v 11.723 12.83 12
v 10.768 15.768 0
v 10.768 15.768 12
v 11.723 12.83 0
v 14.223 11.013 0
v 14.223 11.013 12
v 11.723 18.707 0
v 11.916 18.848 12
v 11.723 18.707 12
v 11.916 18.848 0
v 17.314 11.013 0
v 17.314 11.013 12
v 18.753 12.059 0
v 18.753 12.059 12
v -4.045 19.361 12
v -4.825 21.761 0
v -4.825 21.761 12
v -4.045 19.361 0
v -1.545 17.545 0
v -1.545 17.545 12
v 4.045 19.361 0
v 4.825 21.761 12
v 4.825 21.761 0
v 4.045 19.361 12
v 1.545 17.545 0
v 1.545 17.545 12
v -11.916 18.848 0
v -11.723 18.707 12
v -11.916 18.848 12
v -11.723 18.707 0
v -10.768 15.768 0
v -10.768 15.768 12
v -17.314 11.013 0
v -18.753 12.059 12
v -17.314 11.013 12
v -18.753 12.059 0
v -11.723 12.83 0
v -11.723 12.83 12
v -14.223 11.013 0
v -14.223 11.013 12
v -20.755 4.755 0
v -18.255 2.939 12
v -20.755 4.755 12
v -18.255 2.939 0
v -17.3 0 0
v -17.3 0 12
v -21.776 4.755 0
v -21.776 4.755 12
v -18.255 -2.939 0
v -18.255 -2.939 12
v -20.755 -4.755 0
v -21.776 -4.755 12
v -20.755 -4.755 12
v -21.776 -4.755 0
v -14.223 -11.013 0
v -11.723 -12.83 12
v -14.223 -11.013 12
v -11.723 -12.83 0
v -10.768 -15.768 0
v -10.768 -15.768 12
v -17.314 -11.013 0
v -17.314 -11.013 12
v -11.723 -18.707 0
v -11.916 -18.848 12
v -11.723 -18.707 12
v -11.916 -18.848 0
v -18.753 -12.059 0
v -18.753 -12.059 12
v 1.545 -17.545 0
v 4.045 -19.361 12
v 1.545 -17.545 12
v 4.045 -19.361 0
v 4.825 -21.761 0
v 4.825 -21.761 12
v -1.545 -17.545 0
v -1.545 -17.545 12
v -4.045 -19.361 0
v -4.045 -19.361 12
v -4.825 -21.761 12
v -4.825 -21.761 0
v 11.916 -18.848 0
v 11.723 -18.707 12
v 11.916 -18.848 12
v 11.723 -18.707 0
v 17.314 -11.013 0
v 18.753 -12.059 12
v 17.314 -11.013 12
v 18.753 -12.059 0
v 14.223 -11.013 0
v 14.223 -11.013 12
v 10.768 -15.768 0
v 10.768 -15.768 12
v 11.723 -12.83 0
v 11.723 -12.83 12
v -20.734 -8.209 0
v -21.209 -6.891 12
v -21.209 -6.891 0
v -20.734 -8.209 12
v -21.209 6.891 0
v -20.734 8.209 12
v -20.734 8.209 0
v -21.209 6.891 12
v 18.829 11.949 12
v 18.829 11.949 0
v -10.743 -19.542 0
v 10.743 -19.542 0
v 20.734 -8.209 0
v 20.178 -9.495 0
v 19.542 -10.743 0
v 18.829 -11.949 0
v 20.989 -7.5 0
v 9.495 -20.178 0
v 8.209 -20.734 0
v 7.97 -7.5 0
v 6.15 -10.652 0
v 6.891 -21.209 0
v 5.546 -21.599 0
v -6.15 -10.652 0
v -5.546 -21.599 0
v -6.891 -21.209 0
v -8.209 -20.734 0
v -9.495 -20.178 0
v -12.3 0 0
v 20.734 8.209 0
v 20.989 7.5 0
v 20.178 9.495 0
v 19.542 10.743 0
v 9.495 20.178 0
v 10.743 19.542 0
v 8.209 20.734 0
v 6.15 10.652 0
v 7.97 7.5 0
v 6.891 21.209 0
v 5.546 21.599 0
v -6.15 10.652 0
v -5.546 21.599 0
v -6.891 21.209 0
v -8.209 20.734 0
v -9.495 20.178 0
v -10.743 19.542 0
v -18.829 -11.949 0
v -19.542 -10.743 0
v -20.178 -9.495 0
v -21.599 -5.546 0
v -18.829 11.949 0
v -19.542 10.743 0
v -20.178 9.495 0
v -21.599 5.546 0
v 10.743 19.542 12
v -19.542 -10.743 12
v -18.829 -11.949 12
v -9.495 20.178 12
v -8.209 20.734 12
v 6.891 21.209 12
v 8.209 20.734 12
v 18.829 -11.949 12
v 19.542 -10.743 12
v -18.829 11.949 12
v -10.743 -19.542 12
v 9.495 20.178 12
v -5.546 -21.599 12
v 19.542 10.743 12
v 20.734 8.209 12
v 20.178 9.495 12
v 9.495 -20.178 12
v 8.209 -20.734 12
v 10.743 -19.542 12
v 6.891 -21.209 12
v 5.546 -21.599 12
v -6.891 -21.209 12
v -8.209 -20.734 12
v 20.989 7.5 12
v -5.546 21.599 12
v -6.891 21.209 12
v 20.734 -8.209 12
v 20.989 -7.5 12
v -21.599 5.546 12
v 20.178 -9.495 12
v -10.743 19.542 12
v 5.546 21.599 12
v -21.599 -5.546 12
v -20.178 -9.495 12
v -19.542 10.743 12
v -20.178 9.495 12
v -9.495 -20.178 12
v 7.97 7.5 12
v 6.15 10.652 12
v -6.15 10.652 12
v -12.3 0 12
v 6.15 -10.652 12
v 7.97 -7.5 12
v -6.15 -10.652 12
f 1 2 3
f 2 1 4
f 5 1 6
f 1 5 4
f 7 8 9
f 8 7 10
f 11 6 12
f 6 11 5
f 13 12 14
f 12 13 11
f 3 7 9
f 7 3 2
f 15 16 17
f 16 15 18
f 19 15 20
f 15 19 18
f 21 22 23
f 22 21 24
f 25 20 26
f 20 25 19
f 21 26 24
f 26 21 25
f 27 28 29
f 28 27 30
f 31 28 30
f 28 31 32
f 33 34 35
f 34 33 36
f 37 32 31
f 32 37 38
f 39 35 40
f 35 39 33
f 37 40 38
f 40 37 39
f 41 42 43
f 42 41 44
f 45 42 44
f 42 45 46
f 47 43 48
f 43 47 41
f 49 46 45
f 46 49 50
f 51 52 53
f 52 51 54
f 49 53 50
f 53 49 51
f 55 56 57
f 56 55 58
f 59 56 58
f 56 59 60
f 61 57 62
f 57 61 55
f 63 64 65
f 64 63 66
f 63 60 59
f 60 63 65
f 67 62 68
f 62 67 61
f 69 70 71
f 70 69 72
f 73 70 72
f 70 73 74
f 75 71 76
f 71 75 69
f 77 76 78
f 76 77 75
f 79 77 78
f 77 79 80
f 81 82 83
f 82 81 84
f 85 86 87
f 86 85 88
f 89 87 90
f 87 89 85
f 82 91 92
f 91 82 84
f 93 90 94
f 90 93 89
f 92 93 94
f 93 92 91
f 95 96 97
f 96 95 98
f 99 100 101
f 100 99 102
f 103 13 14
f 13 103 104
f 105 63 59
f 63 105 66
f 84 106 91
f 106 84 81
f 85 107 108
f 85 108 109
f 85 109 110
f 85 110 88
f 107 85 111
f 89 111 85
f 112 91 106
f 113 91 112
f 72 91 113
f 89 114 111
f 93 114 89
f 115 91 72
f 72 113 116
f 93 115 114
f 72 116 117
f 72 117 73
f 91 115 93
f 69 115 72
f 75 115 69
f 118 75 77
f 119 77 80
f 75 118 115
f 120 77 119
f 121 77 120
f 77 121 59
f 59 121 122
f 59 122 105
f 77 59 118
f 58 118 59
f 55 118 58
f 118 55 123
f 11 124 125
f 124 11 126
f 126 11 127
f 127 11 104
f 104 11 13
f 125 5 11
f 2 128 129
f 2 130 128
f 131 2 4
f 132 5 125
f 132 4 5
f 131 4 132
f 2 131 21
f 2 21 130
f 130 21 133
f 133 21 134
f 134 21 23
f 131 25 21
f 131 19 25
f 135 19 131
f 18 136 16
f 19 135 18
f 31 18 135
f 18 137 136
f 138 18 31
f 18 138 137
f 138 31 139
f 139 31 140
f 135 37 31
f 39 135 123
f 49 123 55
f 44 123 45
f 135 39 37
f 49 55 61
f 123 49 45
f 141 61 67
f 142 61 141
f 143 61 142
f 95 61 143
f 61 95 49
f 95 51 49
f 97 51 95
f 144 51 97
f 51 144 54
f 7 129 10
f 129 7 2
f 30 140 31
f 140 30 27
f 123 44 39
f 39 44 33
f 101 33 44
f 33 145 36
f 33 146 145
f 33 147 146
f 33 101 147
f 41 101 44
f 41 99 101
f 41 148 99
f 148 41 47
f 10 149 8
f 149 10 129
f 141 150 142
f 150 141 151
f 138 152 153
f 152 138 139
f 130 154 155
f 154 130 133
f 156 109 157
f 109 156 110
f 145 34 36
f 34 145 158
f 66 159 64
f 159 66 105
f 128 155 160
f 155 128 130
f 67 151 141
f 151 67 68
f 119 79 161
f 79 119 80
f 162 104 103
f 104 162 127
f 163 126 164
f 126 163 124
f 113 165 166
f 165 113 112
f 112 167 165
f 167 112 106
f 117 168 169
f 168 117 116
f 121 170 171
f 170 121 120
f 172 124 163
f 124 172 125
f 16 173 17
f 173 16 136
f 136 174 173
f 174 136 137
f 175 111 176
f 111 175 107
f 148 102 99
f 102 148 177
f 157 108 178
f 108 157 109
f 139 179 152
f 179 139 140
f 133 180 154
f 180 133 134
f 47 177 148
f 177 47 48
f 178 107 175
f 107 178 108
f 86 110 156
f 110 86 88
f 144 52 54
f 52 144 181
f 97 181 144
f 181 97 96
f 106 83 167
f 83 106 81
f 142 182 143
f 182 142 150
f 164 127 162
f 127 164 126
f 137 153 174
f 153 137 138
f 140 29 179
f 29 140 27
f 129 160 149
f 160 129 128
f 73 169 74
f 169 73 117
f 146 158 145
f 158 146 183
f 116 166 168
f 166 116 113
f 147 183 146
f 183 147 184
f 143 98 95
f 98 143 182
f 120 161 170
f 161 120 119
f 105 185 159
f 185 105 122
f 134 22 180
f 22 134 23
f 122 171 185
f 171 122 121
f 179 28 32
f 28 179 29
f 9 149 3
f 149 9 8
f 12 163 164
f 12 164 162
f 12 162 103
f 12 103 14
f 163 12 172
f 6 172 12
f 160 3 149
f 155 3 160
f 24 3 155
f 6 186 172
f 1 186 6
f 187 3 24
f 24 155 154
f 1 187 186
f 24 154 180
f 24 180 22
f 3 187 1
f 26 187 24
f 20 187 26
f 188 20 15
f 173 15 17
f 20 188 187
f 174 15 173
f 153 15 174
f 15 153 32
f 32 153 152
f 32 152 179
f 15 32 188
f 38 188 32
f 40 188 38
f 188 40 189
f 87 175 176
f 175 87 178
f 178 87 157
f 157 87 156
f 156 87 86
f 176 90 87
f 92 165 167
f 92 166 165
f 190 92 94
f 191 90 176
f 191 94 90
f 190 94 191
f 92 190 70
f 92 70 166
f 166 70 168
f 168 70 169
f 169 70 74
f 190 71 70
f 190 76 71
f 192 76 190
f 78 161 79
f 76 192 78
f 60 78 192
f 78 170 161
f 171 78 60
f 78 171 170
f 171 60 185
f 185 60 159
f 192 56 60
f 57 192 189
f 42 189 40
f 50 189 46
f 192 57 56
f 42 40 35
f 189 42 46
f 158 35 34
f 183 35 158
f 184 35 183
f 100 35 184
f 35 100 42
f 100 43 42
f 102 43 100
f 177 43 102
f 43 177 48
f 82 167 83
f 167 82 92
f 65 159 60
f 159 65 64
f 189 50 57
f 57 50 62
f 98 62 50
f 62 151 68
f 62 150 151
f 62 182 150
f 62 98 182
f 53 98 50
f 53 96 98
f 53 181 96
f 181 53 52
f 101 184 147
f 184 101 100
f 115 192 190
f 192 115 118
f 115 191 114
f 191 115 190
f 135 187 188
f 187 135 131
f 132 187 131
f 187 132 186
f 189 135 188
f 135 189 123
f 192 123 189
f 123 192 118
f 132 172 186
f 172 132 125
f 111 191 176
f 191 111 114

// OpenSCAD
wrench_h = 12;
size = 12.3;
strength = 10;

inlet = 15;

inner_rad = size;
outer_rad = inner_rad + strength;

finger_hold_rad = 5;

difference() {
    cylinder(h = wrench_h, r = outer_rad, $fn = 100);
    translate([0,0,-1]) {
        cylinder(h = wrench_h + 2, r = inner_rad, $fn = 6);
    }
    translate([0, -(inlet/2), -1 ]) {
        cube([outer_rad, inlet, wrench_h + 2]);
    }
    for (i = [1 : 7]) {
        angle = i * 45;
        translate([outer_rad*cos(angle),outer_rad*sin(angle), -1]) {
            cylinder(h = wrench_h + 2, r = finger_hold_rad, $fn = 10);
        }
    }
}
